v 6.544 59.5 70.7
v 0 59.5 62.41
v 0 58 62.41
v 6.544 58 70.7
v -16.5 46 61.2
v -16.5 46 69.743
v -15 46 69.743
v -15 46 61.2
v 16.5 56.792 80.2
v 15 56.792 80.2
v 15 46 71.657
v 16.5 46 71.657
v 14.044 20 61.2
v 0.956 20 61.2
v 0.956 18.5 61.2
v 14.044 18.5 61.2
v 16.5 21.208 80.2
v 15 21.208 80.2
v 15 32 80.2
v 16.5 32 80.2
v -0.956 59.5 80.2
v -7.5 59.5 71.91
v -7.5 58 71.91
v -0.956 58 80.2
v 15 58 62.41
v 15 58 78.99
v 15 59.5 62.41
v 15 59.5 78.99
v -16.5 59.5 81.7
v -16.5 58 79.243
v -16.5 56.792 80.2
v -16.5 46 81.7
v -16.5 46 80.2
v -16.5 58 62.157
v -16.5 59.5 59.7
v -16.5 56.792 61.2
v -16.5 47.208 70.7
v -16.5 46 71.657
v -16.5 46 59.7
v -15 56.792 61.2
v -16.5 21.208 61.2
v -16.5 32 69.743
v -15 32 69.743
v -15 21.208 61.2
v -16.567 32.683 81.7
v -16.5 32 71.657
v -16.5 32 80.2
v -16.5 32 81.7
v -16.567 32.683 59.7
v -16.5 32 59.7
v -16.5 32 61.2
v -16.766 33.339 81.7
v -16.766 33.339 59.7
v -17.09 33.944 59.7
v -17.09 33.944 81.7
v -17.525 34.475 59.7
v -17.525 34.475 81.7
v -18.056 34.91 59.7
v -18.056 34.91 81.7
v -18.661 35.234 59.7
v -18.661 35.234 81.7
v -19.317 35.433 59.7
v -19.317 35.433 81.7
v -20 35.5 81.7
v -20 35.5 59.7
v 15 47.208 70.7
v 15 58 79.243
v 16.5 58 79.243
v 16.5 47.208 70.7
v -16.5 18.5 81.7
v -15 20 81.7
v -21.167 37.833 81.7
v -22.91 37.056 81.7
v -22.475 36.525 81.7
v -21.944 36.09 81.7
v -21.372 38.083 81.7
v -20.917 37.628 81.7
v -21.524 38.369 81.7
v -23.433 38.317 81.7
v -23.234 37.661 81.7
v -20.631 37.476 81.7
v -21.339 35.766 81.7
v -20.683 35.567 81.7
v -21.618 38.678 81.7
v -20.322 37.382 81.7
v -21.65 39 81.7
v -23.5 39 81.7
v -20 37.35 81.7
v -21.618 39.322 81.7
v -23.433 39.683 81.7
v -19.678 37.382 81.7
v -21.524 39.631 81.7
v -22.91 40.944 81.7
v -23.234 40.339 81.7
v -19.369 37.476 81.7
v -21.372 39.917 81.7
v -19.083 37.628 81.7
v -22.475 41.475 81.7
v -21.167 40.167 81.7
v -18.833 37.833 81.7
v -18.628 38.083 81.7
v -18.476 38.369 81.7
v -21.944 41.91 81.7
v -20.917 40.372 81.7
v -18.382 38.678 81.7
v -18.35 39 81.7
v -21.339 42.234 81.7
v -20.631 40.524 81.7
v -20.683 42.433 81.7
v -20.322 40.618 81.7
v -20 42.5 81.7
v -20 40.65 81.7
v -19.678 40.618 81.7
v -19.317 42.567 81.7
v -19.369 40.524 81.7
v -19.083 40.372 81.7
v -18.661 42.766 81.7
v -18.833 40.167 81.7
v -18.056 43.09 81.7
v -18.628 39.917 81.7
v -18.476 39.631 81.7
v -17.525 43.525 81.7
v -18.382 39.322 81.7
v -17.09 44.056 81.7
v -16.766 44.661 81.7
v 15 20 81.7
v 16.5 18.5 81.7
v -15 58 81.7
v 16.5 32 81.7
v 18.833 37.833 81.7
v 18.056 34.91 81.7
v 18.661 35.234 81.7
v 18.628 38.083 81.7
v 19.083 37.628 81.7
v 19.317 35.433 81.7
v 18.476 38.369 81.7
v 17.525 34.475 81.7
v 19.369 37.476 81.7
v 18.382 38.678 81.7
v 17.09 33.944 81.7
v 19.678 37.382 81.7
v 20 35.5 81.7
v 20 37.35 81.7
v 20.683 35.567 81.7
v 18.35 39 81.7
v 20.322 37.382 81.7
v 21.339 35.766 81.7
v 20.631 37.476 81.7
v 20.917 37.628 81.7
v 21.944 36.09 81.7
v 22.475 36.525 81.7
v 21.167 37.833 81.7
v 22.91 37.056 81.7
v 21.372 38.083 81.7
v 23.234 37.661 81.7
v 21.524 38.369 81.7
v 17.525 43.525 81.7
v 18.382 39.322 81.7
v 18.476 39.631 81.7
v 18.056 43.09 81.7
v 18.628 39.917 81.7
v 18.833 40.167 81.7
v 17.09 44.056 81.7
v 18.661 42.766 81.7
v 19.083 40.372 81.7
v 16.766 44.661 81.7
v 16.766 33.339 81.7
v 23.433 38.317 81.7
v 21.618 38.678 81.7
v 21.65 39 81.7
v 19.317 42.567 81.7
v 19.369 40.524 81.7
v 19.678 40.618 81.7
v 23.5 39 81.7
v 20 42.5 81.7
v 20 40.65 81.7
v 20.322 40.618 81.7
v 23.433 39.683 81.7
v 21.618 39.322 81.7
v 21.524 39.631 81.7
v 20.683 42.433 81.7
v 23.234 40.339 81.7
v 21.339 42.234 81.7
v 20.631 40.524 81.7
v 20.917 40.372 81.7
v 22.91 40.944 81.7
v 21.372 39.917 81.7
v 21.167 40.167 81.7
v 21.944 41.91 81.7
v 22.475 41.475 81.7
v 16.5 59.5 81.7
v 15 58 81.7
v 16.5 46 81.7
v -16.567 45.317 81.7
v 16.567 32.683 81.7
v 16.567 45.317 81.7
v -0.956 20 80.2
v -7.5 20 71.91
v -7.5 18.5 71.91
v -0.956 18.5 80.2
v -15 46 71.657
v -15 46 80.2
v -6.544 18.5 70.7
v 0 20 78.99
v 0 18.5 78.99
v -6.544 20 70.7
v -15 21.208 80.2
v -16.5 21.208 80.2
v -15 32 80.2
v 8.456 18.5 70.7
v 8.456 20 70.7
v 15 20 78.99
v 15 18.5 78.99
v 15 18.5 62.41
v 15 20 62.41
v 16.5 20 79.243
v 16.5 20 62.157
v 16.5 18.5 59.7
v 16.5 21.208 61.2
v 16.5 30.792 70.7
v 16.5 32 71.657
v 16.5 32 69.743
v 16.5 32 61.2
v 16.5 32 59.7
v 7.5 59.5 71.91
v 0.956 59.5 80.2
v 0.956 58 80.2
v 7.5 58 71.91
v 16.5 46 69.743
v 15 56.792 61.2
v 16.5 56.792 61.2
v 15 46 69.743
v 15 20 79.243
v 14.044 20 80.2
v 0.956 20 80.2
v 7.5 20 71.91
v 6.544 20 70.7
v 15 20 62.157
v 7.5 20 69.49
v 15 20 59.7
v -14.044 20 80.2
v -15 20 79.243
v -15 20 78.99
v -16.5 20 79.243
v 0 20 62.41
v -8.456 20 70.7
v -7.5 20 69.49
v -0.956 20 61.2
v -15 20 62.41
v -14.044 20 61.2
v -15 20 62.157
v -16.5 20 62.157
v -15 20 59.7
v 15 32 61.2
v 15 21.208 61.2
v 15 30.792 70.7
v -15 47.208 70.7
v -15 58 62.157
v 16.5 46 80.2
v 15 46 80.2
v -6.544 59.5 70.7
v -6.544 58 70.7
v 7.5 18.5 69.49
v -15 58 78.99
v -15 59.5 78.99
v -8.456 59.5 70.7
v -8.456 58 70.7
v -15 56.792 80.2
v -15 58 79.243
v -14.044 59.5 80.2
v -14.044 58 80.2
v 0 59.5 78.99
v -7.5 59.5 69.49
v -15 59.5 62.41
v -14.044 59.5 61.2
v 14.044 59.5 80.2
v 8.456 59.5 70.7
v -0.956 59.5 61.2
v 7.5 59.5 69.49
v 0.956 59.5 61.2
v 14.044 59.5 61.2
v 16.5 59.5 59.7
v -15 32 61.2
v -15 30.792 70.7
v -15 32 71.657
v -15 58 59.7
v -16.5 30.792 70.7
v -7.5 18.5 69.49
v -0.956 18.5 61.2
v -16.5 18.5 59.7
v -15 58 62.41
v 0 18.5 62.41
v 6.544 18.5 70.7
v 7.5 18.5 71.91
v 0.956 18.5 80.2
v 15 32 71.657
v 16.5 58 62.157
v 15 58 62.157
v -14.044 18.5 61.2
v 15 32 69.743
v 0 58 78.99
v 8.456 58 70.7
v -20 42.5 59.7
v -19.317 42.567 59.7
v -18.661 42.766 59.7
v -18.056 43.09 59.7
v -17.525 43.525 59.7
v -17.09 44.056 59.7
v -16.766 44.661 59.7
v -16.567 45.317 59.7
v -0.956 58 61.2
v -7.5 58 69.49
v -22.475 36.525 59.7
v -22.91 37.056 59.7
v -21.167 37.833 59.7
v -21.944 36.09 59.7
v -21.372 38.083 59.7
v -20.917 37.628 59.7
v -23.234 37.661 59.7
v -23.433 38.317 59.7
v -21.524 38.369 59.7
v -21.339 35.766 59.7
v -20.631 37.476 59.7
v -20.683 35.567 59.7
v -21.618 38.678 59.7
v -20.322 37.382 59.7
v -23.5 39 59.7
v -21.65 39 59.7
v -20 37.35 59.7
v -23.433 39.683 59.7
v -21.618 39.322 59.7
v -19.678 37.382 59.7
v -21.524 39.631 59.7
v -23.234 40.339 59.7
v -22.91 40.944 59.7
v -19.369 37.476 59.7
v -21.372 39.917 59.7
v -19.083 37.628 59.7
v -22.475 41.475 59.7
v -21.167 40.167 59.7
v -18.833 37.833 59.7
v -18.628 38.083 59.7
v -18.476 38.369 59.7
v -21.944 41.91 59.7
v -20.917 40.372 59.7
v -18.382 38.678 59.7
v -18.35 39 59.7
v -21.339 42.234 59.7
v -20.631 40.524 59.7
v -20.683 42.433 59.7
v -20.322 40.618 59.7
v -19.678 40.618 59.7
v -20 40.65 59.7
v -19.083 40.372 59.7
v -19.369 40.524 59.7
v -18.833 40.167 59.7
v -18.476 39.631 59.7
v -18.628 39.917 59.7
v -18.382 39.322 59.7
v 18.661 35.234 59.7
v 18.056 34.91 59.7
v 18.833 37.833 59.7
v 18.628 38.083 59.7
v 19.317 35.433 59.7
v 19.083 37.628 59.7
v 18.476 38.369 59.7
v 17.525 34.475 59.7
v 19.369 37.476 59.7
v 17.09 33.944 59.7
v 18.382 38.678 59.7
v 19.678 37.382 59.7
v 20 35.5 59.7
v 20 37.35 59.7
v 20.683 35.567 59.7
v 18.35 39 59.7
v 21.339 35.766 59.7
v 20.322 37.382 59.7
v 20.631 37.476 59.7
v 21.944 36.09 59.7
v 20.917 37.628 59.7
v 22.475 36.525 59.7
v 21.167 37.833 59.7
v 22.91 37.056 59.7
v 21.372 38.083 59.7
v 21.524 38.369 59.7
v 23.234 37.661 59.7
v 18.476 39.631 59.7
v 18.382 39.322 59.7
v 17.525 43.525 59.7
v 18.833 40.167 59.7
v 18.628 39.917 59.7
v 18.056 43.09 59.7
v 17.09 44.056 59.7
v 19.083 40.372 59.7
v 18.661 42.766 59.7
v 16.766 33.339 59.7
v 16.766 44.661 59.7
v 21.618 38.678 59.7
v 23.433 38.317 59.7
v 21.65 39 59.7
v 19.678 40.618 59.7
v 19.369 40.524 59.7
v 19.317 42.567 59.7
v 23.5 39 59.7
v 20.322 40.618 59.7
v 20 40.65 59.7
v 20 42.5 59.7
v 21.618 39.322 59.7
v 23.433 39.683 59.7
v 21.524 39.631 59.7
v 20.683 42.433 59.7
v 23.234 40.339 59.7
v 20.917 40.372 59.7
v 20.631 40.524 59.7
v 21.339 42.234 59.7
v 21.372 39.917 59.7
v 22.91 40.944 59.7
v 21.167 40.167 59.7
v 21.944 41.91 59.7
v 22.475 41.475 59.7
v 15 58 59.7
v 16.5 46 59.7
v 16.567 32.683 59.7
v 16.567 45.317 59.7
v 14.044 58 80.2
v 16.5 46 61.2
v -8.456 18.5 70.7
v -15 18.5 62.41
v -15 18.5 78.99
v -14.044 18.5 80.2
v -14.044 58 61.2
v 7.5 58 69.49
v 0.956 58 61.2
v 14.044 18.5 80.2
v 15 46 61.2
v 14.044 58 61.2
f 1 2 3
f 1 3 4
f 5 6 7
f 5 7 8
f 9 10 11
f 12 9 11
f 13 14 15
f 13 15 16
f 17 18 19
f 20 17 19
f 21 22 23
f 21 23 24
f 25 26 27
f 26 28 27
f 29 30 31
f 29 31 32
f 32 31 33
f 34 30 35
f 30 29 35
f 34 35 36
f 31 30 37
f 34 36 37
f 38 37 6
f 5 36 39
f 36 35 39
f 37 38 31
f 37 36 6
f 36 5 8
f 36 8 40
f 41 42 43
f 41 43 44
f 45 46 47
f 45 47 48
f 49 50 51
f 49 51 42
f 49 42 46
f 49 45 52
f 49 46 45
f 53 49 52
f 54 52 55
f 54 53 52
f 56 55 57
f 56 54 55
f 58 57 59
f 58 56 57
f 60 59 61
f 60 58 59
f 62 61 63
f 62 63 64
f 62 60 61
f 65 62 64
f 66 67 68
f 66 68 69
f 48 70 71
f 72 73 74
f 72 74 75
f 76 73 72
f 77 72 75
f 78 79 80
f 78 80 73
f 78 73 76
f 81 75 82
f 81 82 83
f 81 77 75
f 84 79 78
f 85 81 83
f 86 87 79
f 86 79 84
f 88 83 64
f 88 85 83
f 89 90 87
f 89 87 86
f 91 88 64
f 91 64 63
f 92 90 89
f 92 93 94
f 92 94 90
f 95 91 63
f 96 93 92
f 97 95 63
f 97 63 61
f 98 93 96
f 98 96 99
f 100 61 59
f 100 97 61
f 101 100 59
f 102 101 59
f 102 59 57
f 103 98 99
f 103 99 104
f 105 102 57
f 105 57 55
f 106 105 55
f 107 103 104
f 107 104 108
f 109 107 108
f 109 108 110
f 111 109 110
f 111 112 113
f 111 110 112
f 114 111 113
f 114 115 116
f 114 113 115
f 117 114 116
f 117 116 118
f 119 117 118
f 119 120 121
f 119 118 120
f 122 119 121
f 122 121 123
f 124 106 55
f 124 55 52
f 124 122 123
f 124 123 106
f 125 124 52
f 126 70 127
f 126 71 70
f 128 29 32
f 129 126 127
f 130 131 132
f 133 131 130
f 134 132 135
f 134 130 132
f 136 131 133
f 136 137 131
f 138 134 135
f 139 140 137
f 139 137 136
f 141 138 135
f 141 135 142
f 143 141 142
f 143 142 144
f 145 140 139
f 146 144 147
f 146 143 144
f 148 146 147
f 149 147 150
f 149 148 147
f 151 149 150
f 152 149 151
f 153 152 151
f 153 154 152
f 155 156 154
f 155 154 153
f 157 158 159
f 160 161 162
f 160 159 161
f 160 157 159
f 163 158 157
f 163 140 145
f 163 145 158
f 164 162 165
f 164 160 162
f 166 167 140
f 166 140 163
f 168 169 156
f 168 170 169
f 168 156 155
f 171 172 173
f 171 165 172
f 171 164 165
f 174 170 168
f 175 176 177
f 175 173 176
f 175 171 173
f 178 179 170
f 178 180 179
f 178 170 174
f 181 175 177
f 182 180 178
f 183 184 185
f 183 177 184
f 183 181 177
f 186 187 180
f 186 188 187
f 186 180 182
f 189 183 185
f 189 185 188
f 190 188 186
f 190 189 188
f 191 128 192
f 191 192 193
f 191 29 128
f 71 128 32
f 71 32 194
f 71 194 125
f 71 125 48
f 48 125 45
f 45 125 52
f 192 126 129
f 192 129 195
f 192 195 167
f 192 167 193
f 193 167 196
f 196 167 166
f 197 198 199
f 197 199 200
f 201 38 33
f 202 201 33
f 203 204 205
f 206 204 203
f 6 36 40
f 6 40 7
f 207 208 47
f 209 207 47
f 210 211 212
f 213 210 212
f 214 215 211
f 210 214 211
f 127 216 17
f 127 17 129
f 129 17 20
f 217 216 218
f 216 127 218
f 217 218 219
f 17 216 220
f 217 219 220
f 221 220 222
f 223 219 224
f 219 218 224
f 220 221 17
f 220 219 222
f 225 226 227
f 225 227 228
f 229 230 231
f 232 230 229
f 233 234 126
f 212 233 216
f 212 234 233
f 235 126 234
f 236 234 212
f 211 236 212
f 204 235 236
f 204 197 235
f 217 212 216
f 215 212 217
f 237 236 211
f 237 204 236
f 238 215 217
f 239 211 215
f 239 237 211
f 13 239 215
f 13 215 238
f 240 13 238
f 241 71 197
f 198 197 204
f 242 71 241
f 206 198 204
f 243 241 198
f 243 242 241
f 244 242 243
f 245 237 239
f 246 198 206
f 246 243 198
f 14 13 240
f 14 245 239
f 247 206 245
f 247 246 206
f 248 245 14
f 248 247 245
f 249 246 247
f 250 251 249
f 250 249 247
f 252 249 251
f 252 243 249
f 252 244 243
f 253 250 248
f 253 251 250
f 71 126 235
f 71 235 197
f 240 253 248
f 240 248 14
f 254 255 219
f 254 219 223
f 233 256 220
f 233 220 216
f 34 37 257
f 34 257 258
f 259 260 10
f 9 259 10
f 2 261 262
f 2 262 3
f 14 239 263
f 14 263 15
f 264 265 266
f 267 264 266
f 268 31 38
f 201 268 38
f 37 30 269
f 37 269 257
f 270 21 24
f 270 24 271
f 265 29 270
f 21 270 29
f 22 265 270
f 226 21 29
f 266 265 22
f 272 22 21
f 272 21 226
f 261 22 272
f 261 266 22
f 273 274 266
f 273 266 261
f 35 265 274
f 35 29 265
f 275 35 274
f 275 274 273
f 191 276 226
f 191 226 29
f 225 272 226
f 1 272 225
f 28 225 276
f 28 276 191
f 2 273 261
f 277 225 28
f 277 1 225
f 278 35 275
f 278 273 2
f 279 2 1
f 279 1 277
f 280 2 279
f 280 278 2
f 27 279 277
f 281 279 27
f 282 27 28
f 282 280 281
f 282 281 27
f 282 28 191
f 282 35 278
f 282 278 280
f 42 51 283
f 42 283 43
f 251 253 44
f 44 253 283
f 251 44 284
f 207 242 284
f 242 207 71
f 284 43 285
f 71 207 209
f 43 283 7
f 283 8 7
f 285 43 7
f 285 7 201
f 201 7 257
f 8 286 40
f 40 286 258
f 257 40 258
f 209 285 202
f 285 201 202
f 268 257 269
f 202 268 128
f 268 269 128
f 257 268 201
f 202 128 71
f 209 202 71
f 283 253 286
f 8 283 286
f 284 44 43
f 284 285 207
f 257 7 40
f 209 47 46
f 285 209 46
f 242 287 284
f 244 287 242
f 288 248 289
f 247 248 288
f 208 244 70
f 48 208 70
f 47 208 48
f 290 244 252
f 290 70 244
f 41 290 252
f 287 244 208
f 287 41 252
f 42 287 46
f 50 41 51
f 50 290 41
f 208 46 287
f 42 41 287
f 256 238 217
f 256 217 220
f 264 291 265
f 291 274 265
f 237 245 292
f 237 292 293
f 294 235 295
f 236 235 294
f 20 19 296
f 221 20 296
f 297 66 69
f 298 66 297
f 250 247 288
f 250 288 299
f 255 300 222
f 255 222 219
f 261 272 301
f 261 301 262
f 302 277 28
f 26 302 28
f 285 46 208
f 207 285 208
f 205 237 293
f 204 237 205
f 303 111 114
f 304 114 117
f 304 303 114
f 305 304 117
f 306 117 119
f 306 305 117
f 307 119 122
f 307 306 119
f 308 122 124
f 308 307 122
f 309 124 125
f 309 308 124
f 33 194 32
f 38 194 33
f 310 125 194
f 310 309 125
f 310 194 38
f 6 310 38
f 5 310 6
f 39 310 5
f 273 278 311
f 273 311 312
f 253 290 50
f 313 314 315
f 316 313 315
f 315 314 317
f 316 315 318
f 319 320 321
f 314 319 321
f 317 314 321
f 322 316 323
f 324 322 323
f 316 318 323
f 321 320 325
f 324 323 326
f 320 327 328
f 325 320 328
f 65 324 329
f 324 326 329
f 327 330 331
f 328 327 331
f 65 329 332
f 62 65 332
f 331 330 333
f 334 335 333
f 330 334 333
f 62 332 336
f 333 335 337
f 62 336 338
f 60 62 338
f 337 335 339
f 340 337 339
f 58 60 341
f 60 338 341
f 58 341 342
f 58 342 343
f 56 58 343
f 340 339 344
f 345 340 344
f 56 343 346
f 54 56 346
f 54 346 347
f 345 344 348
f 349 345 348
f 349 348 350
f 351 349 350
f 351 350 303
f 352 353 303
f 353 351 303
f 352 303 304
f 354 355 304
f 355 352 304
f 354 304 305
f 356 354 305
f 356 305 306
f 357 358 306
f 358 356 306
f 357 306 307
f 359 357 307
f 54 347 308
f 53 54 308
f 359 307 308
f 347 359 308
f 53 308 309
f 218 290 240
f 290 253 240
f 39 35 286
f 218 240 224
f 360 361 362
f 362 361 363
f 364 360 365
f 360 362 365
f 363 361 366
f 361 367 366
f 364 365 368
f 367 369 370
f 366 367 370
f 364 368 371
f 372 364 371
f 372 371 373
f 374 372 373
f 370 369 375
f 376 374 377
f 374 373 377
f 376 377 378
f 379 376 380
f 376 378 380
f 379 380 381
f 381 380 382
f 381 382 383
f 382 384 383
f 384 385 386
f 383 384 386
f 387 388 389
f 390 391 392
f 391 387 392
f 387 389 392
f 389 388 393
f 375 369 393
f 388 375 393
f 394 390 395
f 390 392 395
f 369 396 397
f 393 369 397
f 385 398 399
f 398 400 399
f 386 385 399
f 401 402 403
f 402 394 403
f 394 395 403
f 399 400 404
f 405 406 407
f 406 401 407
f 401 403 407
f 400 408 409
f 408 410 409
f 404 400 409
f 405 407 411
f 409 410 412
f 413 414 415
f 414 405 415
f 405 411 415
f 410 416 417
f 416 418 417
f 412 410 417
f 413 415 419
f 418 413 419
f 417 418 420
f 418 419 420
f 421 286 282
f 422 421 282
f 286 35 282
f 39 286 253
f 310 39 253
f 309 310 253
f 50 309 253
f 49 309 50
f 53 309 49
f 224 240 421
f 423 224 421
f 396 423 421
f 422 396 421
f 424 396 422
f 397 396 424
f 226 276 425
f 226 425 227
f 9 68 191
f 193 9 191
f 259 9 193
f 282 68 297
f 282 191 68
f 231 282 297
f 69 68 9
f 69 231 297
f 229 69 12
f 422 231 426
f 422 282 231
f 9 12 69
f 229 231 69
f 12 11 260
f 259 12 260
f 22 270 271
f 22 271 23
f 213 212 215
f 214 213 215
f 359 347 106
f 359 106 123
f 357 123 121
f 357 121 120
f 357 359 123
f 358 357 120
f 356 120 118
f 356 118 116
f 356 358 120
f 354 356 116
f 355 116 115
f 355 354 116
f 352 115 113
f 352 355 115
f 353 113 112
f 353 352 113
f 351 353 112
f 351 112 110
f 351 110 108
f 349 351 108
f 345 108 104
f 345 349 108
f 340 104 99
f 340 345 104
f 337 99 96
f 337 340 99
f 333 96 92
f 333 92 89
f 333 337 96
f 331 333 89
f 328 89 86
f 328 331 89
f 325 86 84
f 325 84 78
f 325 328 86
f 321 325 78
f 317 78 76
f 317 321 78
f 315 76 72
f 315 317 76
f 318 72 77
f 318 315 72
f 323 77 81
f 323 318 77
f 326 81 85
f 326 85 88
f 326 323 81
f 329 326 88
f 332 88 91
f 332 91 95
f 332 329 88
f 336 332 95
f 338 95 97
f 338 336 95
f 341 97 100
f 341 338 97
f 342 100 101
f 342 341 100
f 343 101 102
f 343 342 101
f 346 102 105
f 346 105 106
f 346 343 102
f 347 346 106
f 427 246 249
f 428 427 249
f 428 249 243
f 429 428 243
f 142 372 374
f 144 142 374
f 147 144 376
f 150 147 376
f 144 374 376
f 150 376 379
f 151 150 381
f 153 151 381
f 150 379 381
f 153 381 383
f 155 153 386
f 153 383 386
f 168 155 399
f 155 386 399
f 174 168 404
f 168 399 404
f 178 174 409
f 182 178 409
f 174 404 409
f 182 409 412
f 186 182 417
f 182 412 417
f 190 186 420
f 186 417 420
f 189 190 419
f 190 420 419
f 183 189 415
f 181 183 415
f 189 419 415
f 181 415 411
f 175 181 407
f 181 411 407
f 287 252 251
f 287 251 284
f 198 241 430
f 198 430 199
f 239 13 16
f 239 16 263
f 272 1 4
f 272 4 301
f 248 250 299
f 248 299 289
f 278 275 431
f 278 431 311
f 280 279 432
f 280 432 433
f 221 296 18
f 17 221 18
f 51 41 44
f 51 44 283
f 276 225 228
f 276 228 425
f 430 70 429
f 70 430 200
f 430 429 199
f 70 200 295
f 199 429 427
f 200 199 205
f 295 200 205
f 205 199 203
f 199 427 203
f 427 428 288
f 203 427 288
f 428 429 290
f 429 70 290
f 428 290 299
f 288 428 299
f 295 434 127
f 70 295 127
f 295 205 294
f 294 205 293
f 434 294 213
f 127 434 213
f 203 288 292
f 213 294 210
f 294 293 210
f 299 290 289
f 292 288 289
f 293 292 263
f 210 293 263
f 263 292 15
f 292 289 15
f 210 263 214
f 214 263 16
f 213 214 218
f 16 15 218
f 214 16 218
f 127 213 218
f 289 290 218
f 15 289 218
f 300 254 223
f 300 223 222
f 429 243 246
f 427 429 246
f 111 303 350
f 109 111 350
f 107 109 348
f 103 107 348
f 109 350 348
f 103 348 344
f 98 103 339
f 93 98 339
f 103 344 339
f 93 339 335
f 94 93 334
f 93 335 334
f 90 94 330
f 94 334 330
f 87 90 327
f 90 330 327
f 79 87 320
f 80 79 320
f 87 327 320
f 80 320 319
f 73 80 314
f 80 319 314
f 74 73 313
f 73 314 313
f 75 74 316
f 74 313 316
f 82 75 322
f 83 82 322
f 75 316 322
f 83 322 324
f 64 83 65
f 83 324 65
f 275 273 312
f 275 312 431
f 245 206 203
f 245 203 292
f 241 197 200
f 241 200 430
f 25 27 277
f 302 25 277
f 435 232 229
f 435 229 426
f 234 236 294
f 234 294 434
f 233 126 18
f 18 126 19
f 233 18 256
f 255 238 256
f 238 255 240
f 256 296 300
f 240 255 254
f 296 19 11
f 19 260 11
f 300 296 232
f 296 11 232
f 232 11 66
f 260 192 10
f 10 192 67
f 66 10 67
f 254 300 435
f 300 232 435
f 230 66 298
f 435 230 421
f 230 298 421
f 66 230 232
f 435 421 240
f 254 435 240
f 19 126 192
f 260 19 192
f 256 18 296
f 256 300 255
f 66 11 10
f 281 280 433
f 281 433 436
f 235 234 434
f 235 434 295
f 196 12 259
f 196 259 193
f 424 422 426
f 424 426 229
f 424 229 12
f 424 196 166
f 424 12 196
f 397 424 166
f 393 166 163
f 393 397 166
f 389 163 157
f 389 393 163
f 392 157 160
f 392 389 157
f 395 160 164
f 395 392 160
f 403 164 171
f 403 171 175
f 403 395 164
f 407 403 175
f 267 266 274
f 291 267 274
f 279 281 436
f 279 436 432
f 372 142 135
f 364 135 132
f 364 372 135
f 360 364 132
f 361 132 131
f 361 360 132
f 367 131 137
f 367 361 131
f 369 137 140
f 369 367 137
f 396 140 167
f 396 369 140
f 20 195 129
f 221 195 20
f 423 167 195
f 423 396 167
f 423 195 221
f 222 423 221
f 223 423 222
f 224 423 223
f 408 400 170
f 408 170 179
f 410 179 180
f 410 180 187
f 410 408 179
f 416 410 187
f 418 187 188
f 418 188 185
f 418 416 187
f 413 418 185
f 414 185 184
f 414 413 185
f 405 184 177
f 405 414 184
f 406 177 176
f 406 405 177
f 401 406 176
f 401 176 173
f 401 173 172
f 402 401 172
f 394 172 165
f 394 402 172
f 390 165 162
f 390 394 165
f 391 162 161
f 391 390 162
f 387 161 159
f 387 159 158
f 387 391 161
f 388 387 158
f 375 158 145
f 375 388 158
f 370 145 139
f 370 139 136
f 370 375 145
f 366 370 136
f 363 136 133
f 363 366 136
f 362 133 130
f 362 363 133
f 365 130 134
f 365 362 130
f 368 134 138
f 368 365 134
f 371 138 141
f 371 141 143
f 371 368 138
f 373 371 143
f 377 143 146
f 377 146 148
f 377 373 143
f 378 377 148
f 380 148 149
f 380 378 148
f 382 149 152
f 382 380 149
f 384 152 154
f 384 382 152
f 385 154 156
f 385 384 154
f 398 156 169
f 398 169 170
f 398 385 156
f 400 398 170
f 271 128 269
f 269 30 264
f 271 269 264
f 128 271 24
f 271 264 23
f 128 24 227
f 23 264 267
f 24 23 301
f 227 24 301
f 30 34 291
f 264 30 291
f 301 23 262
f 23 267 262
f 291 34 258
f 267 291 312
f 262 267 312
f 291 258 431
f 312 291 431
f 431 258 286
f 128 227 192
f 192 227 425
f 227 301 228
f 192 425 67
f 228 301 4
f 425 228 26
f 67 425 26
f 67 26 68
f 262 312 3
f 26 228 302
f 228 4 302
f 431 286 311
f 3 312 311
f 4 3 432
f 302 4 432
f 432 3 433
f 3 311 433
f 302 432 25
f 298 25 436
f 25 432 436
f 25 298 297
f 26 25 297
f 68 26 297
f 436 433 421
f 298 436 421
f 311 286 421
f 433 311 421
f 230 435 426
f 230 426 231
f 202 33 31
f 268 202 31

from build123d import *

# Parameters (mm, degrees)
SKETCH017_R     = 1.65
SKETCH017_W     = 30
SKETCH017_H     = 38
PAD012_DEPTH    = 22
POCKET057_DEPTH = 41.001
POCKET058_DEPTH = 40.001


with BuildPart() as part:
    # Sketch017 → Pad012 (new body)
    with BuildSketch(Plane.XY):
        with BuildLine():
            Line((-16.5, 18.5), (16.5, 18.5))
            Line((16.5, 18.5), (16.5, 32))
            ThreePointArc((20, 35.5), (17.525126, 34.474874), (16.5, 32))
            ThreePointArc((20, 35.5), (23.5, 39), (20, 42.5))
            ThreePointArc((16.5, 46), (17.525126, 43.525126), (20, 42.5))
            Line((16.5, 59.5), (16.5, 46))
            Line((-16.5, 59.5), (16.5, 59.5))
            Line((-16.5, 59.5), (-16.5, 46))
            ThreePointArc((-20, 42.5), (-17.525126, 43.525126), (-16.5, 46))
            ThreePointArc((-20, 42.5), (-23.5, 39), (-20, 35.5))
            ThreePointArc((-16.5, 32), (-17.525126, 34.474874), (-20, 35.5))
            Line((-16.5, 18.5), (-16.5, 32))
        make_face()
        with Locations((-20, 39)):
            Circle(SKETCH017_R, mode=Mode.SUBTRACT)
        with Locations((20, 39)):
            Circle(SKETCH017_R, mode=Mode.SUBTRACT)
        with Locations((0, 39)):
            Rectangle(SKETCH017_W, SKETCH017_H, mode=Mode.SUBTRACT)
    extrude(amount=PAD012_DEPTH)

    # Sketch111 (on Face7 of Pad012) → Pocket057 (cut, through all)
    with BuildSketch(Plane(origin=(0, 59.5, 0), x_dir=(-1, 0, 0), z_dir=(0, 1, 0))):
        Polygon((-15, 2.710372), (-8.455557, 11), (-15, 19.289628), align=None)
        Polygon((-14.044443, 1.5), (-7.5, 9.789628), (-0.955557, 1.5), align=None)
        Polygon((-14.044443, 20.5), (-0.955557, 20.5), (-7.5, 12.210372), align=None)
        Polygon((-6.544443, 11), (0, 19.289628), (6.544443, 11), (0, 2.710372), align=None)
        Polygon((0.955557, 1.5), (7.5, 9.789628), (14.044443, 1.5), align=None)
        Polygon((8.455557, 11), (15, 2.710372), (15, 19.289628), align=None)
        Polygon((7.5, 12.210372), (0.955557, 20.5), (14.044443, 20.5), align=None)
    extrude(amount=-POCKET057_DEPTH, mode=Mode.SUBTRACT)

    # Sketch112 (on Face2 of Pocket057) → Pocket058 (cut, through all)
    with BuildSketch(Plane(origin=(-16.5, 0, 0), x_dir=(0, -1, 0), z_dir=(-1, 0, 0))):
        Polygon((-56.791693, 1.5), (-46, 10.043423), (-46, 1.5), align=None)
        Polygon((-58, 2.456577), (-58, 19.543423), (-47.208307, 11), align=None)
        Polygon((-32, 1.5), (-32, 10.043423), (-21.208307, 1.5), align=None)
        Polygon((-32, 20.5), (-32, 11.956577), (-21.208307, 20.5), align=None)
        Polygon((-30.791693, 11), (-20, 19.543423), (-20, 2.456577), align=None)
        Polygon((-46, 11.956577), (-46, 20.5), (-56.791693, 20.5), align=None)
    extrude(amount=-POCKET058_DEPTH, mode=Mode.SUBTRACT)


with BuildPart() as part_1:
    # Body011 placement: moved
    add(part.part.moved(Location((0, 0, 59.7))))


solid = part_1.part
